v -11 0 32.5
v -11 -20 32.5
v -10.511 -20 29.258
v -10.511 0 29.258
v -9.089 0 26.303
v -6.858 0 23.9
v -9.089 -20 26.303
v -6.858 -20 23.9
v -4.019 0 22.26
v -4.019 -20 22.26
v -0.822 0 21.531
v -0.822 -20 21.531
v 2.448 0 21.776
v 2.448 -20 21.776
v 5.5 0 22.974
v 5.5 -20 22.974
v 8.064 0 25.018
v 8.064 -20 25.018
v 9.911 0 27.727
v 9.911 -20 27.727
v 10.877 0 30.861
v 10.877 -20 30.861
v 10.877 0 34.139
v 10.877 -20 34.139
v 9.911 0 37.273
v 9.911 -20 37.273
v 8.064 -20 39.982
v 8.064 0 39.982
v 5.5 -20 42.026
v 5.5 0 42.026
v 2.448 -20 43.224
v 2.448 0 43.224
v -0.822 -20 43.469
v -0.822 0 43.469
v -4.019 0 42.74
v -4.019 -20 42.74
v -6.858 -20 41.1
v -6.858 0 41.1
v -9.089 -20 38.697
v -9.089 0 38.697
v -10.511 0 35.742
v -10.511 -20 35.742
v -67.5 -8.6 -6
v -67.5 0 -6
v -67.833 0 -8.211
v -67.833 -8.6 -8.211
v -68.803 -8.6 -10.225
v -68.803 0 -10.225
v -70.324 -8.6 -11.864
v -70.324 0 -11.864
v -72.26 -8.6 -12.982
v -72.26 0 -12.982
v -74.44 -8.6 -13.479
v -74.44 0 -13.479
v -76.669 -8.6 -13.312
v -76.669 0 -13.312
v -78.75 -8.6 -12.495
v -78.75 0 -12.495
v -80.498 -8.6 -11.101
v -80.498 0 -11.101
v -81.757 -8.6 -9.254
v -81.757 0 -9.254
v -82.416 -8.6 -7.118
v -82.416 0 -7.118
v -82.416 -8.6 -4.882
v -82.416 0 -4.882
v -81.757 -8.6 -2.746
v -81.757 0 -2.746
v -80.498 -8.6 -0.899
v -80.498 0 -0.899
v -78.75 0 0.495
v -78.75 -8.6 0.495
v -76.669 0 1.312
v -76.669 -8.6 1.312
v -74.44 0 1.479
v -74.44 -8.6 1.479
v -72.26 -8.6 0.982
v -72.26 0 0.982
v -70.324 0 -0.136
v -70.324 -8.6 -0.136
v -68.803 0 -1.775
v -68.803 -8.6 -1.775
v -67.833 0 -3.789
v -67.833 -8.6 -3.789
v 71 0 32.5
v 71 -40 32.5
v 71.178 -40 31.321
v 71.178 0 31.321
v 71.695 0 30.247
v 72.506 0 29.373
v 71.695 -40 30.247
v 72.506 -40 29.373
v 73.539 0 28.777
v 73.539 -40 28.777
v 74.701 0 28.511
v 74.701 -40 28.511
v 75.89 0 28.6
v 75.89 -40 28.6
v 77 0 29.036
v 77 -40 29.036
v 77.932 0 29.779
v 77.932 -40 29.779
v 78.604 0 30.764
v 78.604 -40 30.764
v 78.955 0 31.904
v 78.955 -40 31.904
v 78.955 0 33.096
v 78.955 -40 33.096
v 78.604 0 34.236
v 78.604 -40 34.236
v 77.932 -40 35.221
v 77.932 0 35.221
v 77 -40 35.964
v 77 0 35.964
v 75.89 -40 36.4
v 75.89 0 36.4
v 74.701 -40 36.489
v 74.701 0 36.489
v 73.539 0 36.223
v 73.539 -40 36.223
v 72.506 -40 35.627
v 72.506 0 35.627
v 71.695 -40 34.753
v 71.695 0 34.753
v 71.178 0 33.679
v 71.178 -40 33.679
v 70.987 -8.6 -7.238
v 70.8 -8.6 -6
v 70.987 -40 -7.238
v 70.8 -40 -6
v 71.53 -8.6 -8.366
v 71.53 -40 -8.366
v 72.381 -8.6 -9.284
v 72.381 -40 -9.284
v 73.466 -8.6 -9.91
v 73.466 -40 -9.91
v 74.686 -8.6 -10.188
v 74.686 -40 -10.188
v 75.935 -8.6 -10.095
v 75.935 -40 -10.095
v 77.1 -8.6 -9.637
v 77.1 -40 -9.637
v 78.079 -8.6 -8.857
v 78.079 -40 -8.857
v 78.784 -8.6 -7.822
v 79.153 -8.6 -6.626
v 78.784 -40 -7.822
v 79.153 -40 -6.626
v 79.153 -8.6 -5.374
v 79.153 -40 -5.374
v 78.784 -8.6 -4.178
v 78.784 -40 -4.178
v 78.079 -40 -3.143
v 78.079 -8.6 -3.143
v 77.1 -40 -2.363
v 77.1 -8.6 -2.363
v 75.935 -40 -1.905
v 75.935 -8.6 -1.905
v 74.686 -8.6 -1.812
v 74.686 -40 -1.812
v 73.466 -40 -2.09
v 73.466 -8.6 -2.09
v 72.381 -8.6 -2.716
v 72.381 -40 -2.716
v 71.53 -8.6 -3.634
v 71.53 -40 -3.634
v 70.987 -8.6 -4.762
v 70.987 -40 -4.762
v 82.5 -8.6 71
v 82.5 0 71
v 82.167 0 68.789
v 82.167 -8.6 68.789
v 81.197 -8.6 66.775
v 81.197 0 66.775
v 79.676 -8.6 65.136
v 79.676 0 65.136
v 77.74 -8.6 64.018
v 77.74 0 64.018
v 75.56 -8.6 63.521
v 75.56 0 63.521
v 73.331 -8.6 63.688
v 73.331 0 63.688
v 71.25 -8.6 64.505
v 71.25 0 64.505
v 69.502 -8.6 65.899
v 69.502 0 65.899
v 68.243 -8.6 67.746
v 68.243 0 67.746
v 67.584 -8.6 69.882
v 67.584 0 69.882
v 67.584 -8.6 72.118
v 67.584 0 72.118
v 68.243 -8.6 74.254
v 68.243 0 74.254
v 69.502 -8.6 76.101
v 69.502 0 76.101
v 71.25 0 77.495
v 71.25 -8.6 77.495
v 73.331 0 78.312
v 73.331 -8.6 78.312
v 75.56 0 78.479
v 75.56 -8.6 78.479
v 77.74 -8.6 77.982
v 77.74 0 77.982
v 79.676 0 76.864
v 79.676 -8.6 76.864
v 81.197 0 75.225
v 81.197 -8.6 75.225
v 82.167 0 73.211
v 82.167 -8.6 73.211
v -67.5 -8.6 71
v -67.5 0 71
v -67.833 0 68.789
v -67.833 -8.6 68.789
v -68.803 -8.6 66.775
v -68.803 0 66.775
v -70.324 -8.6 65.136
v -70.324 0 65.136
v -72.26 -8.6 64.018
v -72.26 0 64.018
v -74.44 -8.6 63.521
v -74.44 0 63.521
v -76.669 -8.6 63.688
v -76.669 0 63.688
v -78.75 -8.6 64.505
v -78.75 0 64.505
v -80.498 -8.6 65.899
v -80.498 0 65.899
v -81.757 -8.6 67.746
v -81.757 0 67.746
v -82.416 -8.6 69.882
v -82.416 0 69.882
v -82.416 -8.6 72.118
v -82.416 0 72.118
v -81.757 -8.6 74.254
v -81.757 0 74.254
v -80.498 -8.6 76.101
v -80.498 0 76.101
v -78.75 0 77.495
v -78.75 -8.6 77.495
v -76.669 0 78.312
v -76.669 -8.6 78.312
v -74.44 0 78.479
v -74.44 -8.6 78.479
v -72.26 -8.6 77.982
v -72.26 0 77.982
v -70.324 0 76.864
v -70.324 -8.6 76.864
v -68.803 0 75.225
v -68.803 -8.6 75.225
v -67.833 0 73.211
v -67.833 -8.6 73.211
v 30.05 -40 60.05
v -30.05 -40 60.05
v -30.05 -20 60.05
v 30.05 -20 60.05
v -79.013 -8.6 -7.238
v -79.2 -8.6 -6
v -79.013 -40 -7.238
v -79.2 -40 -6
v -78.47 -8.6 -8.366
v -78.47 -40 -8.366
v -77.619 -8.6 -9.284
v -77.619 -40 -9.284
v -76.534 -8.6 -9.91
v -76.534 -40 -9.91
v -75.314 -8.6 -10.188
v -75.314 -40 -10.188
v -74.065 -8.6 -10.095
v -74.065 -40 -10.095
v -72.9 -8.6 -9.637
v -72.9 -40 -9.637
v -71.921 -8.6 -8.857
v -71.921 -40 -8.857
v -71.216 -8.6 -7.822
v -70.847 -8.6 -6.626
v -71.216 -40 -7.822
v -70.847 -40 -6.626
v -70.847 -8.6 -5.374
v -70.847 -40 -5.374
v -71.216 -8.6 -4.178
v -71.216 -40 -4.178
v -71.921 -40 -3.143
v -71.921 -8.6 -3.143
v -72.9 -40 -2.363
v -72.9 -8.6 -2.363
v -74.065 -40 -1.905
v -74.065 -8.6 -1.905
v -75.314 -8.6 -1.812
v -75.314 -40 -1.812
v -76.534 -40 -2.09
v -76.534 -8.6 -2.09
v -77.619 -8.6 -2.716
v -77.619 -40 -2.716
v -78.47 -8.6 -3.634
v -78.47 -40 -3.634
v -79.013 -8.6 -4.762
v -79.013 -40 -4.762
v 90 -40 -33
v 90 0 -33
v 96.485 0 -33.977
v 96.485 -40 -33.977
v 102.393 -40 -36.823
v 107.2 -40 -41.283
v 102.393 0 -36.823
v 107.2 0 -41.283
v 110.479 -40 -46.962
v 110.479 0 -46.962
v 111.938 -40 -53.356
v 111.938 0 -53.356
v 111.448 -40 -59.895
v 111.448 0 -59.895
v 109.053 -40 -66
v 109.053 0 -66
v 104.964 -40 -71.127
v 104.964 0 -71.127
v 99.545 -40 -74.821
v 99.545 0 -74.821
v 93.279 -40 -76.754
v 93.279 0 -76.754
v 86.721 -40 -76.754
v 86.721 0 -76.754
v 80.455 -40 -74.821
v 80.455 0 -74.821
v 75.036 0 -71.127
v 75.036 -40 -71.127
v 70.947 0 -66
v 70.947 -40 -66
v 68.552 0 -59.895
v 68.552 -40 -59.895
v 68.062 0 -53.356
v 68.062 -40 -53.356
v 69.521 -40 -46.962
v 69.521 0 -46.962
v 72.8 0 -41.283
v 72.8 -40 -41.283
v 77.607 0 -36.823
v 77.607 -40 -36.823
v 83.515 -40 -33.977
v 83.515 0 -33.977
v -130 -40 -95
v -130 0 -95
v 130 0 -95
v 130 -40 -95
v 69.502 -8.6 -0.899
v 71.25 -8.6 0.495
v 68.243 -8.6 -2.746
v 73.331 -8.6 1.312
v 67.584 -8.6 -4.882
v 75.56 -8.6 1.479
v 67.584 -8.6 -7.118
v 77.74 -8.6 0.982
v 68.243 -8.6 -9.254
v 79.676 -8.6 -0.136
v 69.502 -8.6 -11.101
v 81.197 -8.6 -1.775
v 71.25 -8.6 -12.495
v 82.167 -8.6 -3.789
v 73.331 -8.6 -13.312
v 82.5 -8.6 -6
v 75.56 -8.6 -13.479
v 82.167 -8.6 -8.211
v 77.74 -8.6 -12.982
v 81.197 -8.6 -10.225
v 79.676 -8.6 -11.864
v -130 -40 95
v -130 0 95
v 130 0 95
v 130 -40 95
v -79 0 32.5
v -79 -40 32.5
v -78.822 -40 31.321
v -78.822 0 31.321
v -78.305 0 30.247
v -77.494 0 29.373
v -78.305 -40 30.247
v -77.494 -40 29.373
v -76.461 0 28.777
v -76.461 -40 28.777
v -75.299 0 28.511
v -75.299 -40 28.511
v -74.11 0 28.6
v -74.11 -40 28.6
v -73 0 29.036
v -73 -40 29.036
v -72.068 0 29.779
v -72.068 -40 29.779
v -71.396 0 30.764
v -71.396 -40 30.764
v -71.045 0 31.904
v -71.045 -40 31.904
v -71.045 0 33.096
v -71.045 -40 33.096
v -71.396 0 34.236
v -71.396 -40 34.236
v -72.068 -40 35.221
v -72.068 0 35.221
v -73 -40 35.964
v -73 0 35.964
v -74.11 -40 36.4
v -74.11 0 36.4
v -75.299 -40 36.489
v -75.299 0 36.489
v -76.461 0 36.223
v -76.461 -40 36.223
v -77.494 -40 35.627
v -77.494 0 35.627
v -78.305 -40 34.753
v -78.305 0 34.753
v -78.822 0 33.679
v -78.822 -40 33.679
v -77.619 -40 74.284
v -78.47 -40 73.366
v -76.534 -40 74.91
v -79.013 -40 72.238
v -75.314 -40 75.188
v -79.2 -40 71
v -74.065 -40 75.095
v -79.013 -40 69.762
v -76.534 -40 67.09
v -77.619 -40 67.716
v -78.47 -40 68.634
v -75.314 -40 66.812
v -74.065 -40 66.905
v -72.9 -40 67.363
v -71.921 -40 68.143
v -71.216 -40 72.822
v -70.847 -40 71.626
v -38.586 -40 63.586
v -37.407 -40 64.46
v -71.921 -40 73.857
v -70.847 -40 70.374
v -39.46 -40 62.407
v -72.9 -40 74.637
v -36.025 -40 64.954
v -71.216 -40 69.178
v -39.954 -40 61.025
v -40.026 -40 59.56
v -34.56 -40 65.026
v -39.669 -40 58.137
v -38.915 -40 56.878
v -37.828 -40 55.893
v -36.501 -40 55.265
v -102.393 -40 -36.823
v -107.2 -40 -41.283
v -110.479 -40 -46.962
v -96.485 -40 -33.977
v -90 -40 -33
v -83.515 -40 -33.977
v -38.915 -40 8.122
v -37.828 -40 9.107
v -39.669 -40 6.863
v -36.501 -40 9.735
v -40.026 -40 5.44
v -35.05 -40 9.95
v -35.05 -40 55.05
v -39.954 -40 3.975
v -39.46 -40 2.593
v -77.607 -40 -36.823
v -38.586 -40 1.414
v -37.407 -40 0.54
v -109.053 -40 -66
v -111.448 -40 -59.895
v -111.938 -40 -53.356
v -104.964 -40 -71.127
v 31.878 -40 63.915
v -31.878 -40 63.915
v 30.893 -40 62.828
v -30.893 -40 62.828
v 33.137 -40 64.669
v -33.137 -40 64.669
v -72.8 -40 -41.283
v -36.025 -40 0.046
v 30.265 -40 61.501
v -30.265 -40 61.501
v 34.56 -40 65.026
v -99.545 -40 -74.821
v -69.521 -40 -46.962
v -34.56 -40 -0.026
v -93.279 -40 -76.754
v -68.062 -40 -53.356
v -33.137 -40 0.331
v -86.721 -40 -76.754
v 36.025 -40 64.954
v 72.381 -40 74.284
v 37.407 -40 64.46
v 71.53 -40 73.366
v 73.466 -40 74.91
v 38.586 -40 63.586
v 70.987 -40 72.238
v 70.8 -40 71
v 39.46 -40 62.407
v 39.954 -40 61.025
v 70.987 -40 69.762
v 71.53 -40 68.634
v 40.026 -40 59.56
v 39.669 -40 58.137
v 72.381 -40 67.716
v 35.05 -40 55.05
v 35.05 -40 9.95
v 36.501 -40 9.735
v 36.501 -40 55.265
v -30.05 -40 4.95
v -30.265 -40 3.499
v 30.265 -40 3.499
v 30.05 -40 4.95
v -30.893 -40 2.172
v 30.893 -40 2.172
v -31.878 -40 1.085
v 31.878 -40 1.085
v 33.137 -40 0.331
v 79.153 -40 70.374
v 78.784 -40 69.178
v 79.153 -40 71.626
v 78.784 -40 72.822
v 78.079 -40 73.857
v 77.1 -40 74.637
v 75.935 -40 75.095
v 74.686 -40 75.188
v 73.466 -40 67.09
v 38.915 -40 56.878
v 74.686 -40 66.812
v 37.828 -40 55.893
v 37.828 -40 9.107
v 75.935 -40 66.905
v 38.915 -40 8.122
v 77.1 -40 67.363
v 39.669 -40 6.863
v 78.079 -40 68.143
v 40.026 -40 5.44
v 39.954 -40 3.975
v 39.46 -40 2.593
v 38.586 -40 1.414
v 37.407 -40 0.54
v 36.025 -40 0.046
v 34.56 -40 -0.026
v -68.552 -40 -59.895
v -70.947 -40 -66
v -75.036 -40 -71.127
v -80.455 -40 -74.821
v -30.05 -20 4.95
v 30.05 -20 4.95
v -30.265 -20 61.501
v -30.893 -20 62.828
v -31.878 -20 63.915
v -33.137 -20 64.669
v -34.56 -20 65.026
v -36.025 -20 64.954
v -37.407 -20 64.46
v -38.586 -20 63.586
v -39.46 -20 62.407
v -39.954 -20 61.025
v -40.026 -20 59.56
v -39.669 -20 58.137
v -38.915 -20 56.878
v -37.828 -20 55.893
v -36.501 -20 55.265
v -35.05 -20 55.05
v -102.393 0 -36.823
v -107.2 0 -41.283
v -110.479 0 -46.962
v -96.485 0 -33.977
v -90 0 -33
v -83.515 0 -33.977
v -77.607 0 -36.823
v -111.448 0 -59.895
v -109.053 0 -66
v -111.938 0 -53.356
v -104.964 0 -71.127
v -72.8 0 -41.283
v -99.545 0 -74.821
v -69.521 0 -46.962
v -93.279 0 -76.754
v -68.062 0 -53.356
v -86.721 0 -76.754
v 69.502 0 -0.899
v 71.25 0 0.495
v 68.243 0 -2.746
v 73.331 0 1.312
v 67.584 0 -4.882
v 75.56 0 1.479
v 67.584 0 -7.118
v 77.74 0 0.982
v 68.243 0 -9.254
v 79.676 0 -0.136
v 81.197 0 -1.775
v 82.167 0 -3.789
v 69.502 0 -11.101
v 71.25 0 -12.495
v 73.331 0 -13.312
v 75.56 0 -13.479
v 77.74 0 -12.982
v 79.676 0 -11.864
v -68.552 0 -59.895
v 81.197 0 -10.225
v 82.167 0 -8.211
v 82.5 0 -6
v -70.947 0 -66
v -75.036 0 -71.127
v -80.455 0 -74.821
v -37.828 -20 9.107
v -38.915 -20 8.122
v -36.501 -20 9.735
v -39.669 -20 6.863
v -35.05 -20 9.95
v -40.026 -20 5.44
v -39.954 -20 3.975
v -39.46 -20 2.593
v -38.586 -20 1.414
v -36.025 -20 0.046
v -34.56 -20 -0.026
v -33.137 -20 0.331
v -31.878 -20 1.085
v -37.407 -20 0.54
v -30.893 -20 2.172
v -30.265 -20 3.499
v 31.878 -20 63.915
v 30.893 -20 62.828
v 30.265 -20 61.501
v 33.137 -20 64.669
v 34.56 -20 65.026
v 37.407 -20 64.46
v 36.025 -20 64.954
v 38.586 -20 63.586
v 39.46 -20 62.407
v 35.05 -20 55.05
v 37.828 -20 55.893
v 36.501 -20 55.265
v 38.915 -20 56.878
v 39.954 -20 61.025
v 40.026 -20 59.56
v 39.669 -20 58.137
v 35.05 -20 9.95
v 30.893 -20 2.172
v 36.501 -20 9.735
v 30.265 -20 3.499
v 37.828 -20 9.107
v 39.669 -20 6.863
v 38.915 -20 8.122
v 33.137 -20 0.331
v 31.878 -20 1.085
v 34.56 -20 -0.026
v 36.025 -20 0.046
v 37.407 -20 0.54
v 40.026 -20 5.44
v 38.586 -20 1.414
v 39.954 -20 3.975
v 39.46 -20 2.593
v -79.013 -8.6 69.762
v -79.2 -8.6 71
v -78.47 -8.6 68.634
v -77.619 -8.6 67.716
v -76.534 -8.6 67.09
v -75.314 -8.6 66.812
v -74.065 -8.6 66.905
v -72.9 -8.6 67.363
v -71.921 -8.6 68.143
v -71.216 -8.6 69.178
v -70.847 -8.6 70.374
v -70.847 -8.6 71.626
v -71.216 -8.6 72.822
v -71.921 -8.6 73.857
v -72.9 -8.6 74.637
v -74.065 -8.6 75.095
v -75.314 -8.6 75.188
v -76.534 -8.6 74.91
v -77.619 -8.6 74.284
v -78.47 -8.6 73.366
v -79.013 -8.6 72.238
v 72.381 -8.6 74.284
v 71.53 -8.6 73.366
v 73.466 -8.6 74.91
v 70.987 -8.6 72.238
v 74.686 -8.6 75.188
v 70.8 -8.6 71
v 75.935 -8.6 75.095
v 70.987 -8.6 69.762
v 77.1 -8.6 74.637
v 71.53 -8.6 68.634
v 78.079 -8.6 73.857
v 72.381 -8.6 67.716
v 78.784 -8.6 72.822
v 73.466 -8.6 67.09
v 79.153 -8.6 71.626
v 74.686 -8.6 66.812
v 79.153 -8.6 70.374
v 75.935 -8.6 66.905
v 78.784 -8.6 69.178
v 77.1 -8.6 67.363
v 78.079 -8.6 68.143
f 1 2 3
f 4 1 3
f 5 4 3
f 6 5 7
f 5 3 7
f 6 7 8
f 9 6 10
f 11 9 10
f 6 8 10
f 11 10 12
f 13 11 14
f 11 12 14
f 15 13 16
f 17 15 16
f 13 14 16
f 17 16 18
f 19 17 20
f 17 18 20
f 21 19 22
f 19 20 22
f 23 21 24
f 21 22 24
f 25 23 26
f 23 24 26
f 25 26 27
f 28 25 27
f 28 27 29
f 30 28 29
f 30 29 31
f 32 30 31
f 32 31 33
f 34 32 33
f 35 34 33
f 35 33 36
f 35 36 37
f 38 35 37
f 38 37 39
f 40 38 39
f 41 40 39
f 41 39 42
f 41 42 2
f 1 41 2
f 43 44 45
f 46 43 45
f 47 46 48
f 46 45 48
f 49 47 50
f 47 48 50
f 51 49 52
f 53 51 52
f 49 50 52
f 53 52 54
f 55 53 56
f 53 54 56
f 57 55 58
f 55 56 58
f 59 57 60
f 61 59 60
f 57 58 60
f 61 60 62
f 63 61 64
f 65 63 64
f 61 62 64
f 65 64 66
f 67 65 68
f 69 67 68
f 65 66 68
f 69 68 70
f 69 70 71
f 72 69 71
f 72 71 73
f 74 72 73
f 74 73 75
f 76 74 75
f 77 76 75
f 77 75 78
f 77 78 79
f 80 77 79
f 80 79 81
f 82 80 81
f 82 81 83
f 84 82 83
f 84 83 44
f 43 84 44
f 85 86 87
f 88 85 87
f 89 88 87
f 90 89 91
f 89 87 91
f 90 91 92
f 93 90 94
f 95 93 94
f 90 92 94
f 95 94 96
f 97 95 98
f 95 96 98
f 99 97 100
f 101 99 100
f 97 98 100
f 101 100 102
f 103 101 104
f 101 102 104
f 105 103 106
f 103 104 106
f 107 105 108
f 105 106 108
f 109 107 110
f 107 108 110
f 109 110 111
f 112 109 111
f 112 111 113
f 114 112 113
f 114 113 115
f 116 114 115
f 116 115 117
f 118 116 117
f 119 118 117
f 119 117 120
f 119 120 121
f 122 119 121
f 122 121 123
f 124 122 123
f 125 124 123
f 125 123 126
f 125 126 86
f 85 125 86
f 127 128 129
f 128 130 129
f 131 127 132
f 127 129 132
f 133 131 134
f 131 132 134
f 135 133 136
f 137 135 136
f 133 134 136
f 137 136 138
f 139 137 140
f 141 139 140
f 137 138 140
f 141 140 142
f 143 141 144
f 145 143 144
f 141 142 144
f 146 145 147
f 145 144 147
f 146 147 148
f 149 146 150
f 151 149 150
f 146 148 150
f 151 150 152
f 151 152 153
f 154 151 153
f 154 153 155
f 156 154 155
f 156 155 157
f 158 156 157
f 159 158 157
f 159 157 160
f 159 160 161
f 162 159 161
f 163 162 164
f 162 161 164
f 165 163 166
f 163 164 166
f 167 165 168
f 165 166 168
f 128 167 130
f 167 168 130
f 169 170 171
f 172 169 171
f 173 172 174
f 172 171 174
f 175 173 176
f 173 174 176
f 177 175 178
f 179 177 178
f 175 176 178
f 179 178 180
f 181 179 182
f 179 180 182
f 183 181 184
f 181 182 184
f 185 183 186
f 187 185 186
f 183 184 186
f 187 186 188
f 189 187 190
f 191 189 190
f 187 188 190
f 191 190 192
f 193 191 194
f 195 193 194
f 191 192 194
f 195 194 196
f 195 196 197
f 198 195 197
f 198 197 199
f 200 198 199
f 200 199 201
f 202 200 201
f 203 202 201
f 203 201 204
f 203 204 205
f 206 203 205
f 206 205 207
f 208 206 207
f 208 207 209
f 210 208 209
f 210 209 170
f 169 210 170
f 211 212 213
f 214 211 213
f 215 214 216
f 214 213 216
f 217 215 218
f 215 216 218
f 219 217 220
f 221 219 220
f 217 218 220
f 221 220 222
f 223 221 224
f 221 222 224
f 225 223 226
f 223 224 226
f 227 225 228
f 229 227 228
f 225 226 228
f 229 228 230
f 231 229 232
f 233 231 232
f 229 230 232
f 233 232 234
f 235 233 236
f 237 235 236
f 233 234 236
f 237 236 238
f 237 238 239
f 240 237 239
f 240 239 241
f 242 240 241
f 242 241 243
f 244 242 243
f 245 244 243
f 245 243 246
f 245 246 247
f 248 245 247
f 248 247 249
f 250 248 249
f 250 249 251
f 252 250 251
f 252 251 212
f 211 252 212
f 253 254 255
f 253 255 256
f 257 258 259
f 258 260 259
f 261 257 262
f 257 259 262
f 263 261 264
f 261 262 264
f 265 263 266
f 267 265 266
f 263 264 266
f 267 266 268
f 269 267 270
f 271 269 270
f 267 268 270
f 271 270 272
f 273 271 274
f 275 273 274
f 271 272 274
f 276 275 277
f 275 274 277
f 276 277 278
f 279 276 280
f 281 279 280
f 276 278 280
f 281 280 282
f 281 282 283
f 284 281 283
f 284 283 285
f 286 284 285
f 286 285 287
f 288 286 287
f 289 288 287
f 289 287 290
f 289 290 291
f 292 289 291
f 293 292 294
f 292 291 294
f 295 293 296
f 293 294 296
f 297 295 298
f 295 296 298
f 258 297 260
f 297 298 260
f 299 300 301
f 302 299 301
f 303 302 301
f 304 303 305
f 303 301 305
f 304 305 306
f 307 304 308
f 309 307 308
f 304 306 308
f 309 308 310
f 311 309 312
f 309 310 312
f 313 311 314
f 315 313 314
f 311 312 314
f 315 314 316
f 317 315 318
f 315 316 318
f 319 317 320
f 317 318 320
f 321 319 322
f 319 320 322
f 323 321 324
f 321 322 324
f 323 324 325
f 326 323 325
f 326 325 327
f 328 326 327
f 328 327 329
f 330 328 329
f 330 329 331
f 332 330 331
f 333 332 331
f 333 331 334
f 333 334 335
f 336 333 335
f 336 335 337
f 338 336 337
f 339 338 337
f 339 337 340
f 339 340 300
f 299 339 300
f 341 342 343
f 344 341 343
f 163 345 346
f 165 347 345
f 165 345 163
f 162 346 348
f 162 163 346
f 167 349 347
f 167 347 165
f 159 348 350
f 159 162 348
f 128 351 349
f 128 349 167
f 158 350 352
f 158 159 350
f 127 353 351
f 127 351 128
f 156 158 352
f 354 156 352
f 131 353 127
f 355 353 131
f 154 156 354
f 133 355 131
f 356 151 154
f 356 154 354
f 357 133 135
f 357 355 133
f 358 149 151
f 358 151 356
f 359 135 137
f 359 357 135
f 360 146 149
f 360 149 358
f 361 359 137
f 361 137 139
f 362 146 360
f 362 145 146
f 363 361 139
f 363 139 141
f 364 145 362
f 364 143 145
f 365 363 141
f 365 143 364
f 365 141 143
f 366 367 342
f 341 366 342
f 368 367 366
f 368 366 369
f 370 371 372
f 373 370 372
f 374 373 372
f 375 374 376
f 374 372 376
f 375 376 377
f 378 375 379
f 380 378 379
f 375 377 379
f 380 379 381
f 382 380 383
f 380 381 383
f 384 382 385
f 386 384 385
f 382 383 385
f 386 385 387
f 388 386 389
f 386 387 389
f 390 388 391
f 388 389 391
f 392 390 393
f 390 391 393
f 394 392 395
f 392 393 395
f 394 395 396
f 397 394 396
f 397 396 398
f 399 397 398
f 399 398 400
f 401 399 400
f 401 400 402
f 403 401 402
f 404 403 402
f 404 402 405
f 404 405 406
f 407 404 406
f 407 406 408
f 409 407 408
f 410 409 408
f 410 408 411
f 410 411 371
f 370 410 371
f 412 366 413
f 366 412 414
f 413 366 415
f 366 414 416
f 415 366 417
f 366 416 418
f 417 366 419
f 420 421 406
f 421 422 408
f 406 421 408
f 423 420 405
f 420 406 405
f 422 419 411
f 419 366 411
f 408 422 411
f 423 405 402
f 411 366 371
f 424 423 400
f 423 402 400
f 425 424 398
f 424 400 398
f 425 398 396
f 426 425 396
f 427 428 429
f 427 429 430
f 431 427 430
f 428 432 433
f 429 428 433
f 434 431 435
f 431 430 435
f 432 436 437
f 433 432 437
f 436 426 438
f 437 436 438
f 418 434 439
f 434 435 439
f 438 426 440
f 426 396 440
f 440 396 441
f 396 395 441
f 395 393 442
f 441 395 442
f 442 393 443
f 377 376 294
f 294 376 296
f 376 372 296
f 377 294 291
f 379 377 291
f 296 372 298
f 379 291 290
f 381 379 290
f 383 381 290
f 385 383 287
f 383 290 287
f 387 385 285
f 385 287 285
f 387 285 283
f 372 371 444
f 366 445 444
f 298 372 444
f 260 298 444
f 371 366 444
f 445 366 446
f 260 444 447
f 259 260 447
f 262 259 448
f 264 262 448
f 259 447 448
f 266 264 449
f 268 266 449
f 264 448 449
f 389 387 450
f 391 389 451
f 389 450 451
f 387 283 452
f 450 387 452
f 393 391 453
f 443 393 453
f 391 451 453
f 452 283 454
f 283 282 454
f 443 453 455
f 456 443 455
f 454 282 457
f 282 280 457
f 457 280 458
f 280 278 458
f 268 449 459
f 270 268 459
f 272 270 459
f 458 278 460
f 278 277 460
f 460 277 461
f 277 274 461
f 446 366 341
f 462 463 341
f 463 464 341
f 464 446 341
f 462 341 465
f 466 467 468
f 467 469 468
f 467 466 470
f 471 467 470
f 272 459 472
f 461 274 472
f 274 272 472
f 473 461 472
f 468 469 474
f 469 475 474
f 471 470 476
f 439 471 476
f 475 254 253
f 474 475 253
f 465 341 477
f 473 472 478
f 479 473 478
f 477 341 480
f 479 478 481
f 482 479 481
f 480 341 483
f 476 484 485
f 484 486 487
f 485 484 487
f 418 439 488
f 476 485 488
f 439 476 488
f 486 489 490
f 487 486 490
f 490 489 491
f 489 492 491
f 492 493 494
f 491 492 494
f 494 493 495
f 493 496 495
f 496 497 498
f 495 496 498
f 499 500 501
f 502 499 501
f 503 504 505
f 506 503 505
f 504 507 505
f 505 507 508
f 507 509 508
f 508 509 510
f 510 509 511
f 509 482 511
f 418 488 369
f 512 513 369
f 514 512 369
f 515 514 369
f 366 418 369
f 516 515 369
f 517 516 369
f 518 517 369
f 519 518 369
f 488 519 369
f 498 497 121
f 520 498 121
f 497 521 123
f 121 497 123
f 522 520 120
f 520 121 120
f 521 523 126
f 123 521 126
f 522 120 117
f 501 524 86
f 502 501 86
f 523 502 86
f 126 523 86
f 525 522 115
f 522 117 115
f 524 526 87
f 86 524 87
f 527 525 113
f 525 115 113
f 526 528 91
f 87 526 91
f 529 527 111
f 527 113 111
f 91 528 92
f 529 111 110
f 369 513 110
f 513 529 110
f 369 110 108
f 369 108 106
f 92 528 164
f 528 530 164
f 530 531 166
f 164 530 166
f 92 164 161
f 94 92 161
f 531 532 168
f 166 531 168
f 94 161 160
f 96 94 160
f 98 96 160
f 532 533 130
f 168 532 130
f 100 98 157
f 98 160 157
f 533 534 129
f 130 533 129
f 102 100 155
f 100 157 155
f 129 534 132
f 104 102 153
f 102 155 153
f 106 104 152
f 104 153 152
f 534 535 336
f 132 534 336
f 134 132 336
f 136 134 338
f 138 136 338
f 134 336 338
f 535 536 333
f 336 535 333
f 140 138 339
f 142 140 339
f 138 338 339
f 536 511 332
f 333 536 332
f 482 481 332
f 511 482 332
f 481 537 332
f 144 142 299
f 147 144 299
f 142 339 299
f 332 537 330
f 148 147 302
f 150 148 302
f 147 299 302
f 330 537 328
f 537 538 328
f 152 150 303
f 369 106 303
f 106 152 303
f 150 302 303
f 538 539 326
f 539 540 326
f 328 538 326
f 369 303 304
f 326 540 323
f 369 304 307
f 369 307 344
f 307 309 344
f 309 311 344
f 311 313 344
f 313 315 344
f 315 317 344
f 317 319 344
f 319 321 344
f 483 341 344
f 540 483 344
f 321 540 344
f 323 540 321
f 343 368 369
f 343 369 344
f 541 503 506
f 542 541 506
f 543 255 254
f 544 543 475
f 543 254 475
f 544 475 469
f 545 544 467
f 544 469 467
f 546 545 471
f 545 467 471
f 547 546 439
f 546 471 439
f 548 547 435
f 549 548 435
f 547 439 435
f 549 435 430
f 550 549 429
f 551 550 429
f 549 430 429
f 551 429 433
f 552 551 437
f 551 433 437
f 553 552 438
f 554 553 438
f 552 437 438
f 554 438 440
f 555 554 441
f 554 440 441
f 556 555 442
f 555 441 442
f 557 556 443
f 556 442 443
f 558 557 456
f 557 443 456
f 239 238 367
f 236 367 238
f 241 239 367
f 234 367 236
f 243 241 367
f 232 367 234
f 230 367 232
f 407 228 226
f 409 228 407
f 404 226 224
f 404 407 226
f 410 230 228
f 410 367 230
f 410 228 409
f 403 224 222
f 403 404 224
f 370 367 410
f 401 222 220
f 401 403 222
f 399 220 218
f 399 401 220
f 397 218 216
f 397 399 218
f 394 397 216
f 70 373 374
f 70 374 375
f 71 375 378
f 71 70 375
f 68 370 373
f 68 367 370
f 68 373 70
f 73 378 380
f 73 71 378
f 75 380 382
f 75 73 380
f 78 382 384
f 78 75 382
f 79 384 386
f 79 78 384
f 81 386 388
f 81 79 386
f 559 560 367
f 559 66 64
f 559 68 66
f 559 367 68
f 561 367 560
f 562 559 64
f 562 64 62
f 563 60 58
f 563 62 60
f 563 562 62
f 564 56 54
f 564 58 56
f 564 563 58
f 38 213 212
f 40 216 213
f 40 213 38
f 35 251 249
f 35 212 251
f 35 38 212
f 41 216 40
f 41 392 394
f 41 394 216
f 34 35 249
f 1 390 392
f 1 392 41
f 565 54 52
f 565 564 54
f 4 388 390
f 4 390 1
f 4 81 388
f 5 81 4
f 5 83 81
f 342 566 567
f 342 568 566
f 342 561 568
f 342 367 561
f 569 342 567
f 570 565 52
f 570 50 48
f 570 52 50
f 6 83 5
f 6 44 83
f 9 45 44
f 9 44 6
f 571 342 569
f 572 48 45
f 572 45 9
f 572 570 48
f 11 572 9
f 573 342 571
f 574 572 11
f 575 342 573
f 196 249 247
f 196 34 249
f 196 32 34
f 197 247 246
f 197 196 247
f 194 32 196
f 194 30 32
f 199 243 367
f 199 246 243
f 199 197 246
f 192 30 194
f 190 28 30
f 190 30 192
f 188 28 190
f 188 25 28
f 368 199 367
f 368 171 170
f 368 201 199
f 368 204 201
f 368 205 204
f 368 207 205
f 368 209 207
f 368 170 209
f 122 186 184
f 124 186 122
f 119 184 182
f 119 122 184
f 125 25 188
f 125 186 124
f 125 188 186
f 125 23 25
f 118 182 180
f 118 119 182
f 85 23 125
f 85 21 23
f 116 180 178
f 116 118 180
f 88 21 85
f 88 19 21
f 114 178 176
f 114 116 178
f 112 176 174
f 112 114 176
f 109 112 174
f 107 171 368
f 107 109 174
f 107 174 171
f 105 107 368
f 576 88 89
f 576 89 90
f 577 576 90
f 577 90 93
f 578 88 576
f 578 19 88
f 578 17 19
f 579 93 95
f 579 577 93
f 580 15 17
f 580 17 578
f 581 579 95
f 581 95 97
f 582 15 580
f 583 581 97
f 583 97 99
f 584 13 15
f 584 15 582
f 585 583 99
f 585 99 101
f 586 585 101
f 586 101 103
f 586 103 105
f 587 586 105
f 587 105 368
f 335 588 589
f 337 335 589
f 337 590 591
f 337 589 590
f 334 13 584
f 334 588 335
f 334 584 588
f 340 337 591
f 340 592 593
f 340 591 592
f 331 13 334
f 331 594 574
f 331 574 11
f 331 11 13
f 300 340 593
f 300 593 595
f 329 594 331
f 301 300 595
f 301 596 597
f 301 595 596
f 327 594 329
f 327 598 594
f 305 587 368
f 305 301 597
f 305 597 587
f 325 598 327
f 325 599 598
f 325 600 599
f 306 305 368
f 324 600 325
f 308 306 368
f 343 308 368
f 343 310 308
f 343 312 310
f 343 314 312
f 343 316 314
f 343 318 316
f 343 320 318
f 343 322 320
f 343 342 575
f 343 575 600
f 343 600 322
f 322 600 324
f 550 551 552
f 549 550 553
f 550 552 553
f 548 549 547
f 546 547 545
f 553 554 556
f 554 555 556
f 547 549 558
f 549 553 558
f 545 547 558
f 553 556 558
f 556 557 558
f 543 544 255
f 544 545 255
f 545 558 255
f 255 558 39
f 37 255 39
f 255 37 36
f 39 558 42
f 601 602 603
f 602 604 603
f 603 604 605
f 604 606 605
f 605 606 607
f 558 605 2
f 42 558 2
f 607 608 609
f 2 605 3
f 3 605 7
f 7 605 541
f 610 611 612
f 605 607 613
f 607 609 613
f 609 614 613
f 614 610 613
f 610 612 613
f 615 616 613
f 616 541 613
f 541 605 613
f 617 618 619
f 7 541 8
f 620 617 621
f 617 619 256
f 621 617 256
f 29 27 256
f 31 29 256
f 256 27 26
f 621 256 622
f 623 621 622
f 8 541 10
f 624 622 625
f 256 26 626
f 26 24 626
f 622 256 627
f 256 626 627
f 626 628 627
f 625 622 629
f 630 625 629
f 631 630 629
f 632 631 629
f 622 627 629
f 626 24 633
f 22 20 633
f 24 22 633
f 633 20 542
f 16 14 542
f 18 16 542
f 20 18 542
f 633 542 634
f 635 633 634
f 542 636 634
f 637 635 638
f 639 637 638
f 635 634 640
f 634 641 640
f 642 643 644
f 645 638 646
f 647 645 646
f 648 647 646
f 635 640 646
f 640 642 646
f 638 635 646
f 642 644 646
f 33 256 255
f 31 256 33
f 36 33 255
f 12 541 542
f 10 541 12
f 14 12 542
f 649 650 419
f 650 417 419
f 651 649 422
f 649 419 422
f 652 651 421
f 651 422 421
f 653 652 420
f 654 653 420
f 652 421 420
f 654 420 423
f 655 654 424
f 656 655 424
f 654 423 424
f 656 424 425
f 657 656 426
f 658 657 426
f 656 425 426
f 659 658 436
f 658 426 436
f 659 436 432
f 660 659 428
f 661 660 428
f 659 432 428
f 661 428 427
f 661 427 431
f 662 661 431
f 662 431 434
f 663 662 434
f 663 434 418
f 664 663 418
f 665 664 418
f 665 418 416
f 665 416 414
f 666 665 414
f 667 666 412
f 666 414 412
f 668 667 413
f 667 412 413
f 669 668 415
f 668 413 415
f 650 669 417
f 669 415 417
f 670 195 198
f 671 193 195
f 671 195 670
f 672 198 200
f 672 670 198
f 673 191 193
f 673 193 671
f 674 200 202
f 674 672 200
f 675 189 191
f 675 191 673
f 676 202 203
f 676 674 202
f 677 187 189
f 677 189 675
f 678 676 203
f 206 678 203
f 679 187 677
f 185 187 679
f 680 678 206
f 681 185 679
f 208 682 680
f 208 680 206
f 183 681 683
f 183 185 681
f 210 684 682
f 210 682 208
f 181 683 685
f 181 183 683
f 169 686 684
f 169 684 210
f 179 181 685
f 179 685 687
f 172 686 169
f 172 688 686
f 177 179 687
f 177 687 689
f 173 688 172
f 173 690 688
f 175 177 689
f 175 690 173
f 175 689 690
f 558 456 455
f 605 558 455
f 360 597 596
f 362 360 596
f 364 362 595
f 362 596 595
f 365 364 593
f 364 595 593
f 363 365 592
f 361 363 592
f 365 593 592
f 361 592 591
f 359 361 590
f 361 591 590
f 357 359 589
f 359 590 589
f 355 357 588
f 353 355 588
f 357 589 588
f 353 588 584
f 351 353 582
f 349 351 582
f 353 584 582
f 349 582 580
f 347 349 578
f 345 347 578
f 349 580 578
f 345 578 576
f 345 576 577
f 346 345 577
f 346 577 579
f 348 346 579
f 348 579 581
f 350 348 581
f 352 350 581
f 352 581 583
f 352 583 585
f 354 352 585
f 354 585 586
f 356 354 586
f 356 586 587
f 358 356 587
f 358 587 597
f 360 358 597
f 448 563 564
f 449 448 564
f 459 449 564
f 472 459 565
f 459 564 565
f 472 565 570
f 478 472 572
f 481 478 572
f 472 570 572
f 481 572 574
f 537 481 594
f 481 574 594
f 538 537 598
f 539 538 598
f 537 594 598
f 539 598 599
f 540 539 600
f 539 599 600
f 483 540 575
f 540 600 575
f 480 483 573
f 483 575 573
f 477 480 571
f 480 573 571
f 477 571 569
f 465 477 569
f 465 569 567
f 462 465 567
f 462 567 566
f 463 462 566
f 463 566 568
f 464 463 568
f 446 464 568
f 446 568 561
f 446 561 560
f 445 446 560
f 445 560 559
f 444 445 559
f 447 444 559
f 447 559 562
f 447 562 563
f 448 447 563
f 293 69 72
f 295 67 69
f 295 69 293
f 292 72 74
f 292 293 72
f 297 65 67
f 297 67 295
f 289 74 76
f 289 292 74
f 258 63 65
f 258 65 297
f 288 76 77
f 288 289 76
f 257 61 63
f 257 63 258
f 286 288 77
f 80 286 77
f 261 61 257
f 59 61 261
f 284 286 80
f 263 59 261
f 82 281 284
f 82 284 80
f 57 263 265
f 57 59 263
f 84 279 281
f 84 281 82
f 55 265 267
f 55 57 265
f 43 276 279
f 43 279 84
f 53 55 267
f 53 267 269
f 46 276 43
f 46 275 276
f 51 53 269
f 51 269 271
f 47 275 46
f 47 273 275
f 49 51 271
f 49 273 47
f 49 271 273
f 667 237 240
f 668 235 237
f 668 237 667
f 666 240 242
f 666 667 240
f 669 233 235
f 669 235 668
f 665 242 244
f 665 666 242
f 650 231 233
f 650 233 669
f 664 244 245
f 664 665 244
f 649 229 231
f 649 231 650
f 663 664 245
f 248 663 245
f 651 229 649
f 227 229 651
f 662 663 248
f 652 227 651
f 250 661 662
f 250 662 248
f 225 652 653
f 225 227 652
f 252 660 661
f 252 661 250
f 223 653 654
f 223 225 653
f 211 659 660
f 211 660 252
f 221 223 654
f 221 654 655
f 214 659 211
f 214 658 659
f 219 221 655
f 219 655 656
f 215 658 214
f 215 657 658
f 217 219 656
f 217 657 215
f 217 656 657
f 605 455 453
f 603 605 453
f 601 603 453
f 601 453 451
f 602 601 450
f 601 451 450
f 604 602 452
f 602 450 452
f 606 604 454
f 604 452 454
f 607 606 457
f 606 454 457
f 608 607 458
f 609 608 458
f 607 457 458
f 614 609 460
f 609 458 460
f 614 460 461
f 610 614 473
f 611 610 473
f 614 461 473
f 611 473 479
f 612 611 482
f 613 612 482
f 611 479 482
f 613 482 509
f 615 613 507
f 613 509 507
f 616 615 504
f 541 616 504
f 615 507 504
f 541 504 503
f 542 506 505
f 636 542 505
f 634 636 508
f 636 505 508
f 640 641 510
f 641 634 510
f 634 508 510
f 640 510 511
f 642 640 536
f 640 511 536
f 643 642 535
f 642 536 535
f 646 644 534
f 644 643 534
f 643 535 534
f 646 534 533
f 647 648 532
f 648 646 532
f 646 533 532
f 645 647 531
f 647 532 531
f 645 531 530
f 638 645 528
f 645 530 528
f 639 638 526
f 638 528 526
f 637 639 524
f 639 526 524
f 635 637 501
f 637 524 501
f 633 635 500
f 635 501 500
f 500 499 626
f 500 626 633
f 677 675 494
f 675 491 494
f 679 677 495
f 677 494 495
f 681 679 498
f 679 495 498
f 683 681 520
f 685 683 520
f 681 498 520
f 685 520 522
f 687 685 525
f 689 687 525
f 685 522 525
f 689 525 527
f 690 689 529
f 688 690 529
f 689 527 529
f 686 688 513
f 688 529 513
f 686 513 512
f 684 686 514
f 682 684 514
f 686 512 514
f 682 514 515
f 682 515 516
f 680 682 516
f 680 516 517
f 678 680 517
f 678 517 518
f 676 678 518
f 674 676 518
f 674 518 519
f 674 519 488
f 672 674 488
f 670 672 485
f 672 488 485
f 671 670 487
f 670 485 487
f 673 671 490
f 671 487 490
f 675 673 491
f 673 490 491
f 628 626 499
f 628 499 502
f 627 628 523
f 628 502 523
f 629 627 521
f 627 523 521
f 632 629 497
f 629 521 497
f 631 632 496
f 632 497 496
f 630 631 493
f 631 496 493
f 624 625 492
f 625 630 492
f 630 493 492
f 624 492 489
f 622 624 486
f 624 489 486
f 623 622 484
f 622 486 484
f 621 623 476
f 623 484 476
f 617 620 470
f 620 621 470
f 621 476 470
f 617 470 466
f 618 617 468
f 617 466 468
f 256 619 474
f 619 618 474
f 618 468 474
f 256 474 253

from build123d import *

# Parameters (mm, degrees)
SKETCH1_W                                           = 260
SKETCH1_H                                           = 190
BOSS_EXTRUDE1_DEPTH                                 = 40
SKETCH2_R                                           = 22
CUT_EXTRUDE1_DEPTH                                  = 166.90660023
M24X2_0_TAPPED_HOLE1_D                              = 22
SKETCH7_W                                           = 70.1
SKETCH7_H                                           = 55.1
CUT_EXTRUDE2_DEPTH                                  = 20
SKETCH8_R                                           = 5
CUT_EXTRUDE3_DEPTH                                  = 20
CBORE_FOR_M8_HEX_SOCKET_HEAD_CAP_SCREW1_D           = 8.4
CBORE_FOR_M8_HEX_SOCKET_HEAD_CAP_SCREW1_CBORE_D     = 15
CBORE_FOR_M8_HEX_SOCKET_HEAD_CAP_SCREW1_CBORE_DEPTH = 8.6
F_8_0MM_DOWEL_HOLE1_D                               = 8


with BuildPart() as part:
    # Sketch1 → Boss-Extrude1 (new body)
    with BuildSketch(Plane(origin=(0, 0, 0), x_dir=(1, 0, 0), z_dir=(0, 1, 0))):
        Rectangle(SKETCH1_W, SKETCH1_H)
    extrude(amount=-BOSS_EXTRUDE1_DEPTH)

    # Sketch2 → Cut-Extrude1 (cut, through all)
    with BuildSketch(Plane(origin=(0, 0, 0), x_dir=(1, 0, 0), z_dir=(0, 1, 0))):
        with Locations(Location((-90, 55, 0), (0, 0, 270))):
            Circle(SKETCH2_R)
        with Locations(Location((90, 55, 0), (0, 0, 270))):
            Circle(SKETCH2_R)
    extrude(amount=-CUT_EXTRUDE1_DEPTH, mode=Mode.SUBTRACT)

    # M24x2.0 Tapped Hole1 (through all)
    with Locations(Plane(origin=(0, 0, 0), x_dir=(1, 0, 0), z_dir=(0, 1, 0))):
        with Locations((0, -32.5)):
            Hole(M24X2_0_TAPPED_HOLE1_D / 2)

    # Sketch7 → Cut-Extrude2 (cut)
    with BuildSketch(Plane(origin=(0, -40, 0), x_dir=(1, 0, 0), z_dir=(0, 1, 0))):
        with Locations((0, -32.5)):
            Rectangle(SKETCH7_W, SKETCH7_H)
    extrude(amount=CUT_EXTRUDE2_DEPTH, mode=Mode.SUBTRACT)

    # Sketch8 → Cut-Extrude3 (cut)
    with BuildSketch(Plane.XZ.offset(40)):
        with Locations((-35.05, 60.05)):
            Circle(SKETCH8_R)
        with Locations((35.05, 60.05)):
            Circle(SKETCH8_R)
        with Locations((-35.05, 4.95)):
            Circle(SKETCH8_R)
        with Locations((35.05, 4.95)):
            Circle(SKETCH8_R)
    extrude(amount=-CUT_EXTRUDE3_DEPTH, mode=Mode.SUBTRACT)

    # CBORE for M8 Hex Socket Head Cap Screw1 (through all)
    with Locations(Plane(origin=(0, 0, 0), x_dir=(1, 0, 0), z_dir=(0, 1, 0))):
        with Locations((-75, -71), (-75, 6), (75, 6), (75, -71)):
            CounterBoreHole(CBORE_FOR_M8_HEX_SOCKET_HEAD_CAP_SCREW1_D / 2, CBORE_FOR_M8_HEX_SOCKET_HEAD_CAP_SCREW1_CBORE_D / 2, CBORE_FOR_M8_HEX_SOCKET_HEAD_CAP_SCREW1_CBORE_DEPTH)

    # Ø8.0mm Dowel Hole1 (through all)
    with Locations(Plane(origin=(0, 0, 0), x_dir=(1, 0, 0), z_dir=(0, 1, 0))):
        with Locations((-75, -32.5), (75, -32.5)):
            Hole(F_8_0MM_DOWEL_HOLE1_D / 2)


solid = part.part
